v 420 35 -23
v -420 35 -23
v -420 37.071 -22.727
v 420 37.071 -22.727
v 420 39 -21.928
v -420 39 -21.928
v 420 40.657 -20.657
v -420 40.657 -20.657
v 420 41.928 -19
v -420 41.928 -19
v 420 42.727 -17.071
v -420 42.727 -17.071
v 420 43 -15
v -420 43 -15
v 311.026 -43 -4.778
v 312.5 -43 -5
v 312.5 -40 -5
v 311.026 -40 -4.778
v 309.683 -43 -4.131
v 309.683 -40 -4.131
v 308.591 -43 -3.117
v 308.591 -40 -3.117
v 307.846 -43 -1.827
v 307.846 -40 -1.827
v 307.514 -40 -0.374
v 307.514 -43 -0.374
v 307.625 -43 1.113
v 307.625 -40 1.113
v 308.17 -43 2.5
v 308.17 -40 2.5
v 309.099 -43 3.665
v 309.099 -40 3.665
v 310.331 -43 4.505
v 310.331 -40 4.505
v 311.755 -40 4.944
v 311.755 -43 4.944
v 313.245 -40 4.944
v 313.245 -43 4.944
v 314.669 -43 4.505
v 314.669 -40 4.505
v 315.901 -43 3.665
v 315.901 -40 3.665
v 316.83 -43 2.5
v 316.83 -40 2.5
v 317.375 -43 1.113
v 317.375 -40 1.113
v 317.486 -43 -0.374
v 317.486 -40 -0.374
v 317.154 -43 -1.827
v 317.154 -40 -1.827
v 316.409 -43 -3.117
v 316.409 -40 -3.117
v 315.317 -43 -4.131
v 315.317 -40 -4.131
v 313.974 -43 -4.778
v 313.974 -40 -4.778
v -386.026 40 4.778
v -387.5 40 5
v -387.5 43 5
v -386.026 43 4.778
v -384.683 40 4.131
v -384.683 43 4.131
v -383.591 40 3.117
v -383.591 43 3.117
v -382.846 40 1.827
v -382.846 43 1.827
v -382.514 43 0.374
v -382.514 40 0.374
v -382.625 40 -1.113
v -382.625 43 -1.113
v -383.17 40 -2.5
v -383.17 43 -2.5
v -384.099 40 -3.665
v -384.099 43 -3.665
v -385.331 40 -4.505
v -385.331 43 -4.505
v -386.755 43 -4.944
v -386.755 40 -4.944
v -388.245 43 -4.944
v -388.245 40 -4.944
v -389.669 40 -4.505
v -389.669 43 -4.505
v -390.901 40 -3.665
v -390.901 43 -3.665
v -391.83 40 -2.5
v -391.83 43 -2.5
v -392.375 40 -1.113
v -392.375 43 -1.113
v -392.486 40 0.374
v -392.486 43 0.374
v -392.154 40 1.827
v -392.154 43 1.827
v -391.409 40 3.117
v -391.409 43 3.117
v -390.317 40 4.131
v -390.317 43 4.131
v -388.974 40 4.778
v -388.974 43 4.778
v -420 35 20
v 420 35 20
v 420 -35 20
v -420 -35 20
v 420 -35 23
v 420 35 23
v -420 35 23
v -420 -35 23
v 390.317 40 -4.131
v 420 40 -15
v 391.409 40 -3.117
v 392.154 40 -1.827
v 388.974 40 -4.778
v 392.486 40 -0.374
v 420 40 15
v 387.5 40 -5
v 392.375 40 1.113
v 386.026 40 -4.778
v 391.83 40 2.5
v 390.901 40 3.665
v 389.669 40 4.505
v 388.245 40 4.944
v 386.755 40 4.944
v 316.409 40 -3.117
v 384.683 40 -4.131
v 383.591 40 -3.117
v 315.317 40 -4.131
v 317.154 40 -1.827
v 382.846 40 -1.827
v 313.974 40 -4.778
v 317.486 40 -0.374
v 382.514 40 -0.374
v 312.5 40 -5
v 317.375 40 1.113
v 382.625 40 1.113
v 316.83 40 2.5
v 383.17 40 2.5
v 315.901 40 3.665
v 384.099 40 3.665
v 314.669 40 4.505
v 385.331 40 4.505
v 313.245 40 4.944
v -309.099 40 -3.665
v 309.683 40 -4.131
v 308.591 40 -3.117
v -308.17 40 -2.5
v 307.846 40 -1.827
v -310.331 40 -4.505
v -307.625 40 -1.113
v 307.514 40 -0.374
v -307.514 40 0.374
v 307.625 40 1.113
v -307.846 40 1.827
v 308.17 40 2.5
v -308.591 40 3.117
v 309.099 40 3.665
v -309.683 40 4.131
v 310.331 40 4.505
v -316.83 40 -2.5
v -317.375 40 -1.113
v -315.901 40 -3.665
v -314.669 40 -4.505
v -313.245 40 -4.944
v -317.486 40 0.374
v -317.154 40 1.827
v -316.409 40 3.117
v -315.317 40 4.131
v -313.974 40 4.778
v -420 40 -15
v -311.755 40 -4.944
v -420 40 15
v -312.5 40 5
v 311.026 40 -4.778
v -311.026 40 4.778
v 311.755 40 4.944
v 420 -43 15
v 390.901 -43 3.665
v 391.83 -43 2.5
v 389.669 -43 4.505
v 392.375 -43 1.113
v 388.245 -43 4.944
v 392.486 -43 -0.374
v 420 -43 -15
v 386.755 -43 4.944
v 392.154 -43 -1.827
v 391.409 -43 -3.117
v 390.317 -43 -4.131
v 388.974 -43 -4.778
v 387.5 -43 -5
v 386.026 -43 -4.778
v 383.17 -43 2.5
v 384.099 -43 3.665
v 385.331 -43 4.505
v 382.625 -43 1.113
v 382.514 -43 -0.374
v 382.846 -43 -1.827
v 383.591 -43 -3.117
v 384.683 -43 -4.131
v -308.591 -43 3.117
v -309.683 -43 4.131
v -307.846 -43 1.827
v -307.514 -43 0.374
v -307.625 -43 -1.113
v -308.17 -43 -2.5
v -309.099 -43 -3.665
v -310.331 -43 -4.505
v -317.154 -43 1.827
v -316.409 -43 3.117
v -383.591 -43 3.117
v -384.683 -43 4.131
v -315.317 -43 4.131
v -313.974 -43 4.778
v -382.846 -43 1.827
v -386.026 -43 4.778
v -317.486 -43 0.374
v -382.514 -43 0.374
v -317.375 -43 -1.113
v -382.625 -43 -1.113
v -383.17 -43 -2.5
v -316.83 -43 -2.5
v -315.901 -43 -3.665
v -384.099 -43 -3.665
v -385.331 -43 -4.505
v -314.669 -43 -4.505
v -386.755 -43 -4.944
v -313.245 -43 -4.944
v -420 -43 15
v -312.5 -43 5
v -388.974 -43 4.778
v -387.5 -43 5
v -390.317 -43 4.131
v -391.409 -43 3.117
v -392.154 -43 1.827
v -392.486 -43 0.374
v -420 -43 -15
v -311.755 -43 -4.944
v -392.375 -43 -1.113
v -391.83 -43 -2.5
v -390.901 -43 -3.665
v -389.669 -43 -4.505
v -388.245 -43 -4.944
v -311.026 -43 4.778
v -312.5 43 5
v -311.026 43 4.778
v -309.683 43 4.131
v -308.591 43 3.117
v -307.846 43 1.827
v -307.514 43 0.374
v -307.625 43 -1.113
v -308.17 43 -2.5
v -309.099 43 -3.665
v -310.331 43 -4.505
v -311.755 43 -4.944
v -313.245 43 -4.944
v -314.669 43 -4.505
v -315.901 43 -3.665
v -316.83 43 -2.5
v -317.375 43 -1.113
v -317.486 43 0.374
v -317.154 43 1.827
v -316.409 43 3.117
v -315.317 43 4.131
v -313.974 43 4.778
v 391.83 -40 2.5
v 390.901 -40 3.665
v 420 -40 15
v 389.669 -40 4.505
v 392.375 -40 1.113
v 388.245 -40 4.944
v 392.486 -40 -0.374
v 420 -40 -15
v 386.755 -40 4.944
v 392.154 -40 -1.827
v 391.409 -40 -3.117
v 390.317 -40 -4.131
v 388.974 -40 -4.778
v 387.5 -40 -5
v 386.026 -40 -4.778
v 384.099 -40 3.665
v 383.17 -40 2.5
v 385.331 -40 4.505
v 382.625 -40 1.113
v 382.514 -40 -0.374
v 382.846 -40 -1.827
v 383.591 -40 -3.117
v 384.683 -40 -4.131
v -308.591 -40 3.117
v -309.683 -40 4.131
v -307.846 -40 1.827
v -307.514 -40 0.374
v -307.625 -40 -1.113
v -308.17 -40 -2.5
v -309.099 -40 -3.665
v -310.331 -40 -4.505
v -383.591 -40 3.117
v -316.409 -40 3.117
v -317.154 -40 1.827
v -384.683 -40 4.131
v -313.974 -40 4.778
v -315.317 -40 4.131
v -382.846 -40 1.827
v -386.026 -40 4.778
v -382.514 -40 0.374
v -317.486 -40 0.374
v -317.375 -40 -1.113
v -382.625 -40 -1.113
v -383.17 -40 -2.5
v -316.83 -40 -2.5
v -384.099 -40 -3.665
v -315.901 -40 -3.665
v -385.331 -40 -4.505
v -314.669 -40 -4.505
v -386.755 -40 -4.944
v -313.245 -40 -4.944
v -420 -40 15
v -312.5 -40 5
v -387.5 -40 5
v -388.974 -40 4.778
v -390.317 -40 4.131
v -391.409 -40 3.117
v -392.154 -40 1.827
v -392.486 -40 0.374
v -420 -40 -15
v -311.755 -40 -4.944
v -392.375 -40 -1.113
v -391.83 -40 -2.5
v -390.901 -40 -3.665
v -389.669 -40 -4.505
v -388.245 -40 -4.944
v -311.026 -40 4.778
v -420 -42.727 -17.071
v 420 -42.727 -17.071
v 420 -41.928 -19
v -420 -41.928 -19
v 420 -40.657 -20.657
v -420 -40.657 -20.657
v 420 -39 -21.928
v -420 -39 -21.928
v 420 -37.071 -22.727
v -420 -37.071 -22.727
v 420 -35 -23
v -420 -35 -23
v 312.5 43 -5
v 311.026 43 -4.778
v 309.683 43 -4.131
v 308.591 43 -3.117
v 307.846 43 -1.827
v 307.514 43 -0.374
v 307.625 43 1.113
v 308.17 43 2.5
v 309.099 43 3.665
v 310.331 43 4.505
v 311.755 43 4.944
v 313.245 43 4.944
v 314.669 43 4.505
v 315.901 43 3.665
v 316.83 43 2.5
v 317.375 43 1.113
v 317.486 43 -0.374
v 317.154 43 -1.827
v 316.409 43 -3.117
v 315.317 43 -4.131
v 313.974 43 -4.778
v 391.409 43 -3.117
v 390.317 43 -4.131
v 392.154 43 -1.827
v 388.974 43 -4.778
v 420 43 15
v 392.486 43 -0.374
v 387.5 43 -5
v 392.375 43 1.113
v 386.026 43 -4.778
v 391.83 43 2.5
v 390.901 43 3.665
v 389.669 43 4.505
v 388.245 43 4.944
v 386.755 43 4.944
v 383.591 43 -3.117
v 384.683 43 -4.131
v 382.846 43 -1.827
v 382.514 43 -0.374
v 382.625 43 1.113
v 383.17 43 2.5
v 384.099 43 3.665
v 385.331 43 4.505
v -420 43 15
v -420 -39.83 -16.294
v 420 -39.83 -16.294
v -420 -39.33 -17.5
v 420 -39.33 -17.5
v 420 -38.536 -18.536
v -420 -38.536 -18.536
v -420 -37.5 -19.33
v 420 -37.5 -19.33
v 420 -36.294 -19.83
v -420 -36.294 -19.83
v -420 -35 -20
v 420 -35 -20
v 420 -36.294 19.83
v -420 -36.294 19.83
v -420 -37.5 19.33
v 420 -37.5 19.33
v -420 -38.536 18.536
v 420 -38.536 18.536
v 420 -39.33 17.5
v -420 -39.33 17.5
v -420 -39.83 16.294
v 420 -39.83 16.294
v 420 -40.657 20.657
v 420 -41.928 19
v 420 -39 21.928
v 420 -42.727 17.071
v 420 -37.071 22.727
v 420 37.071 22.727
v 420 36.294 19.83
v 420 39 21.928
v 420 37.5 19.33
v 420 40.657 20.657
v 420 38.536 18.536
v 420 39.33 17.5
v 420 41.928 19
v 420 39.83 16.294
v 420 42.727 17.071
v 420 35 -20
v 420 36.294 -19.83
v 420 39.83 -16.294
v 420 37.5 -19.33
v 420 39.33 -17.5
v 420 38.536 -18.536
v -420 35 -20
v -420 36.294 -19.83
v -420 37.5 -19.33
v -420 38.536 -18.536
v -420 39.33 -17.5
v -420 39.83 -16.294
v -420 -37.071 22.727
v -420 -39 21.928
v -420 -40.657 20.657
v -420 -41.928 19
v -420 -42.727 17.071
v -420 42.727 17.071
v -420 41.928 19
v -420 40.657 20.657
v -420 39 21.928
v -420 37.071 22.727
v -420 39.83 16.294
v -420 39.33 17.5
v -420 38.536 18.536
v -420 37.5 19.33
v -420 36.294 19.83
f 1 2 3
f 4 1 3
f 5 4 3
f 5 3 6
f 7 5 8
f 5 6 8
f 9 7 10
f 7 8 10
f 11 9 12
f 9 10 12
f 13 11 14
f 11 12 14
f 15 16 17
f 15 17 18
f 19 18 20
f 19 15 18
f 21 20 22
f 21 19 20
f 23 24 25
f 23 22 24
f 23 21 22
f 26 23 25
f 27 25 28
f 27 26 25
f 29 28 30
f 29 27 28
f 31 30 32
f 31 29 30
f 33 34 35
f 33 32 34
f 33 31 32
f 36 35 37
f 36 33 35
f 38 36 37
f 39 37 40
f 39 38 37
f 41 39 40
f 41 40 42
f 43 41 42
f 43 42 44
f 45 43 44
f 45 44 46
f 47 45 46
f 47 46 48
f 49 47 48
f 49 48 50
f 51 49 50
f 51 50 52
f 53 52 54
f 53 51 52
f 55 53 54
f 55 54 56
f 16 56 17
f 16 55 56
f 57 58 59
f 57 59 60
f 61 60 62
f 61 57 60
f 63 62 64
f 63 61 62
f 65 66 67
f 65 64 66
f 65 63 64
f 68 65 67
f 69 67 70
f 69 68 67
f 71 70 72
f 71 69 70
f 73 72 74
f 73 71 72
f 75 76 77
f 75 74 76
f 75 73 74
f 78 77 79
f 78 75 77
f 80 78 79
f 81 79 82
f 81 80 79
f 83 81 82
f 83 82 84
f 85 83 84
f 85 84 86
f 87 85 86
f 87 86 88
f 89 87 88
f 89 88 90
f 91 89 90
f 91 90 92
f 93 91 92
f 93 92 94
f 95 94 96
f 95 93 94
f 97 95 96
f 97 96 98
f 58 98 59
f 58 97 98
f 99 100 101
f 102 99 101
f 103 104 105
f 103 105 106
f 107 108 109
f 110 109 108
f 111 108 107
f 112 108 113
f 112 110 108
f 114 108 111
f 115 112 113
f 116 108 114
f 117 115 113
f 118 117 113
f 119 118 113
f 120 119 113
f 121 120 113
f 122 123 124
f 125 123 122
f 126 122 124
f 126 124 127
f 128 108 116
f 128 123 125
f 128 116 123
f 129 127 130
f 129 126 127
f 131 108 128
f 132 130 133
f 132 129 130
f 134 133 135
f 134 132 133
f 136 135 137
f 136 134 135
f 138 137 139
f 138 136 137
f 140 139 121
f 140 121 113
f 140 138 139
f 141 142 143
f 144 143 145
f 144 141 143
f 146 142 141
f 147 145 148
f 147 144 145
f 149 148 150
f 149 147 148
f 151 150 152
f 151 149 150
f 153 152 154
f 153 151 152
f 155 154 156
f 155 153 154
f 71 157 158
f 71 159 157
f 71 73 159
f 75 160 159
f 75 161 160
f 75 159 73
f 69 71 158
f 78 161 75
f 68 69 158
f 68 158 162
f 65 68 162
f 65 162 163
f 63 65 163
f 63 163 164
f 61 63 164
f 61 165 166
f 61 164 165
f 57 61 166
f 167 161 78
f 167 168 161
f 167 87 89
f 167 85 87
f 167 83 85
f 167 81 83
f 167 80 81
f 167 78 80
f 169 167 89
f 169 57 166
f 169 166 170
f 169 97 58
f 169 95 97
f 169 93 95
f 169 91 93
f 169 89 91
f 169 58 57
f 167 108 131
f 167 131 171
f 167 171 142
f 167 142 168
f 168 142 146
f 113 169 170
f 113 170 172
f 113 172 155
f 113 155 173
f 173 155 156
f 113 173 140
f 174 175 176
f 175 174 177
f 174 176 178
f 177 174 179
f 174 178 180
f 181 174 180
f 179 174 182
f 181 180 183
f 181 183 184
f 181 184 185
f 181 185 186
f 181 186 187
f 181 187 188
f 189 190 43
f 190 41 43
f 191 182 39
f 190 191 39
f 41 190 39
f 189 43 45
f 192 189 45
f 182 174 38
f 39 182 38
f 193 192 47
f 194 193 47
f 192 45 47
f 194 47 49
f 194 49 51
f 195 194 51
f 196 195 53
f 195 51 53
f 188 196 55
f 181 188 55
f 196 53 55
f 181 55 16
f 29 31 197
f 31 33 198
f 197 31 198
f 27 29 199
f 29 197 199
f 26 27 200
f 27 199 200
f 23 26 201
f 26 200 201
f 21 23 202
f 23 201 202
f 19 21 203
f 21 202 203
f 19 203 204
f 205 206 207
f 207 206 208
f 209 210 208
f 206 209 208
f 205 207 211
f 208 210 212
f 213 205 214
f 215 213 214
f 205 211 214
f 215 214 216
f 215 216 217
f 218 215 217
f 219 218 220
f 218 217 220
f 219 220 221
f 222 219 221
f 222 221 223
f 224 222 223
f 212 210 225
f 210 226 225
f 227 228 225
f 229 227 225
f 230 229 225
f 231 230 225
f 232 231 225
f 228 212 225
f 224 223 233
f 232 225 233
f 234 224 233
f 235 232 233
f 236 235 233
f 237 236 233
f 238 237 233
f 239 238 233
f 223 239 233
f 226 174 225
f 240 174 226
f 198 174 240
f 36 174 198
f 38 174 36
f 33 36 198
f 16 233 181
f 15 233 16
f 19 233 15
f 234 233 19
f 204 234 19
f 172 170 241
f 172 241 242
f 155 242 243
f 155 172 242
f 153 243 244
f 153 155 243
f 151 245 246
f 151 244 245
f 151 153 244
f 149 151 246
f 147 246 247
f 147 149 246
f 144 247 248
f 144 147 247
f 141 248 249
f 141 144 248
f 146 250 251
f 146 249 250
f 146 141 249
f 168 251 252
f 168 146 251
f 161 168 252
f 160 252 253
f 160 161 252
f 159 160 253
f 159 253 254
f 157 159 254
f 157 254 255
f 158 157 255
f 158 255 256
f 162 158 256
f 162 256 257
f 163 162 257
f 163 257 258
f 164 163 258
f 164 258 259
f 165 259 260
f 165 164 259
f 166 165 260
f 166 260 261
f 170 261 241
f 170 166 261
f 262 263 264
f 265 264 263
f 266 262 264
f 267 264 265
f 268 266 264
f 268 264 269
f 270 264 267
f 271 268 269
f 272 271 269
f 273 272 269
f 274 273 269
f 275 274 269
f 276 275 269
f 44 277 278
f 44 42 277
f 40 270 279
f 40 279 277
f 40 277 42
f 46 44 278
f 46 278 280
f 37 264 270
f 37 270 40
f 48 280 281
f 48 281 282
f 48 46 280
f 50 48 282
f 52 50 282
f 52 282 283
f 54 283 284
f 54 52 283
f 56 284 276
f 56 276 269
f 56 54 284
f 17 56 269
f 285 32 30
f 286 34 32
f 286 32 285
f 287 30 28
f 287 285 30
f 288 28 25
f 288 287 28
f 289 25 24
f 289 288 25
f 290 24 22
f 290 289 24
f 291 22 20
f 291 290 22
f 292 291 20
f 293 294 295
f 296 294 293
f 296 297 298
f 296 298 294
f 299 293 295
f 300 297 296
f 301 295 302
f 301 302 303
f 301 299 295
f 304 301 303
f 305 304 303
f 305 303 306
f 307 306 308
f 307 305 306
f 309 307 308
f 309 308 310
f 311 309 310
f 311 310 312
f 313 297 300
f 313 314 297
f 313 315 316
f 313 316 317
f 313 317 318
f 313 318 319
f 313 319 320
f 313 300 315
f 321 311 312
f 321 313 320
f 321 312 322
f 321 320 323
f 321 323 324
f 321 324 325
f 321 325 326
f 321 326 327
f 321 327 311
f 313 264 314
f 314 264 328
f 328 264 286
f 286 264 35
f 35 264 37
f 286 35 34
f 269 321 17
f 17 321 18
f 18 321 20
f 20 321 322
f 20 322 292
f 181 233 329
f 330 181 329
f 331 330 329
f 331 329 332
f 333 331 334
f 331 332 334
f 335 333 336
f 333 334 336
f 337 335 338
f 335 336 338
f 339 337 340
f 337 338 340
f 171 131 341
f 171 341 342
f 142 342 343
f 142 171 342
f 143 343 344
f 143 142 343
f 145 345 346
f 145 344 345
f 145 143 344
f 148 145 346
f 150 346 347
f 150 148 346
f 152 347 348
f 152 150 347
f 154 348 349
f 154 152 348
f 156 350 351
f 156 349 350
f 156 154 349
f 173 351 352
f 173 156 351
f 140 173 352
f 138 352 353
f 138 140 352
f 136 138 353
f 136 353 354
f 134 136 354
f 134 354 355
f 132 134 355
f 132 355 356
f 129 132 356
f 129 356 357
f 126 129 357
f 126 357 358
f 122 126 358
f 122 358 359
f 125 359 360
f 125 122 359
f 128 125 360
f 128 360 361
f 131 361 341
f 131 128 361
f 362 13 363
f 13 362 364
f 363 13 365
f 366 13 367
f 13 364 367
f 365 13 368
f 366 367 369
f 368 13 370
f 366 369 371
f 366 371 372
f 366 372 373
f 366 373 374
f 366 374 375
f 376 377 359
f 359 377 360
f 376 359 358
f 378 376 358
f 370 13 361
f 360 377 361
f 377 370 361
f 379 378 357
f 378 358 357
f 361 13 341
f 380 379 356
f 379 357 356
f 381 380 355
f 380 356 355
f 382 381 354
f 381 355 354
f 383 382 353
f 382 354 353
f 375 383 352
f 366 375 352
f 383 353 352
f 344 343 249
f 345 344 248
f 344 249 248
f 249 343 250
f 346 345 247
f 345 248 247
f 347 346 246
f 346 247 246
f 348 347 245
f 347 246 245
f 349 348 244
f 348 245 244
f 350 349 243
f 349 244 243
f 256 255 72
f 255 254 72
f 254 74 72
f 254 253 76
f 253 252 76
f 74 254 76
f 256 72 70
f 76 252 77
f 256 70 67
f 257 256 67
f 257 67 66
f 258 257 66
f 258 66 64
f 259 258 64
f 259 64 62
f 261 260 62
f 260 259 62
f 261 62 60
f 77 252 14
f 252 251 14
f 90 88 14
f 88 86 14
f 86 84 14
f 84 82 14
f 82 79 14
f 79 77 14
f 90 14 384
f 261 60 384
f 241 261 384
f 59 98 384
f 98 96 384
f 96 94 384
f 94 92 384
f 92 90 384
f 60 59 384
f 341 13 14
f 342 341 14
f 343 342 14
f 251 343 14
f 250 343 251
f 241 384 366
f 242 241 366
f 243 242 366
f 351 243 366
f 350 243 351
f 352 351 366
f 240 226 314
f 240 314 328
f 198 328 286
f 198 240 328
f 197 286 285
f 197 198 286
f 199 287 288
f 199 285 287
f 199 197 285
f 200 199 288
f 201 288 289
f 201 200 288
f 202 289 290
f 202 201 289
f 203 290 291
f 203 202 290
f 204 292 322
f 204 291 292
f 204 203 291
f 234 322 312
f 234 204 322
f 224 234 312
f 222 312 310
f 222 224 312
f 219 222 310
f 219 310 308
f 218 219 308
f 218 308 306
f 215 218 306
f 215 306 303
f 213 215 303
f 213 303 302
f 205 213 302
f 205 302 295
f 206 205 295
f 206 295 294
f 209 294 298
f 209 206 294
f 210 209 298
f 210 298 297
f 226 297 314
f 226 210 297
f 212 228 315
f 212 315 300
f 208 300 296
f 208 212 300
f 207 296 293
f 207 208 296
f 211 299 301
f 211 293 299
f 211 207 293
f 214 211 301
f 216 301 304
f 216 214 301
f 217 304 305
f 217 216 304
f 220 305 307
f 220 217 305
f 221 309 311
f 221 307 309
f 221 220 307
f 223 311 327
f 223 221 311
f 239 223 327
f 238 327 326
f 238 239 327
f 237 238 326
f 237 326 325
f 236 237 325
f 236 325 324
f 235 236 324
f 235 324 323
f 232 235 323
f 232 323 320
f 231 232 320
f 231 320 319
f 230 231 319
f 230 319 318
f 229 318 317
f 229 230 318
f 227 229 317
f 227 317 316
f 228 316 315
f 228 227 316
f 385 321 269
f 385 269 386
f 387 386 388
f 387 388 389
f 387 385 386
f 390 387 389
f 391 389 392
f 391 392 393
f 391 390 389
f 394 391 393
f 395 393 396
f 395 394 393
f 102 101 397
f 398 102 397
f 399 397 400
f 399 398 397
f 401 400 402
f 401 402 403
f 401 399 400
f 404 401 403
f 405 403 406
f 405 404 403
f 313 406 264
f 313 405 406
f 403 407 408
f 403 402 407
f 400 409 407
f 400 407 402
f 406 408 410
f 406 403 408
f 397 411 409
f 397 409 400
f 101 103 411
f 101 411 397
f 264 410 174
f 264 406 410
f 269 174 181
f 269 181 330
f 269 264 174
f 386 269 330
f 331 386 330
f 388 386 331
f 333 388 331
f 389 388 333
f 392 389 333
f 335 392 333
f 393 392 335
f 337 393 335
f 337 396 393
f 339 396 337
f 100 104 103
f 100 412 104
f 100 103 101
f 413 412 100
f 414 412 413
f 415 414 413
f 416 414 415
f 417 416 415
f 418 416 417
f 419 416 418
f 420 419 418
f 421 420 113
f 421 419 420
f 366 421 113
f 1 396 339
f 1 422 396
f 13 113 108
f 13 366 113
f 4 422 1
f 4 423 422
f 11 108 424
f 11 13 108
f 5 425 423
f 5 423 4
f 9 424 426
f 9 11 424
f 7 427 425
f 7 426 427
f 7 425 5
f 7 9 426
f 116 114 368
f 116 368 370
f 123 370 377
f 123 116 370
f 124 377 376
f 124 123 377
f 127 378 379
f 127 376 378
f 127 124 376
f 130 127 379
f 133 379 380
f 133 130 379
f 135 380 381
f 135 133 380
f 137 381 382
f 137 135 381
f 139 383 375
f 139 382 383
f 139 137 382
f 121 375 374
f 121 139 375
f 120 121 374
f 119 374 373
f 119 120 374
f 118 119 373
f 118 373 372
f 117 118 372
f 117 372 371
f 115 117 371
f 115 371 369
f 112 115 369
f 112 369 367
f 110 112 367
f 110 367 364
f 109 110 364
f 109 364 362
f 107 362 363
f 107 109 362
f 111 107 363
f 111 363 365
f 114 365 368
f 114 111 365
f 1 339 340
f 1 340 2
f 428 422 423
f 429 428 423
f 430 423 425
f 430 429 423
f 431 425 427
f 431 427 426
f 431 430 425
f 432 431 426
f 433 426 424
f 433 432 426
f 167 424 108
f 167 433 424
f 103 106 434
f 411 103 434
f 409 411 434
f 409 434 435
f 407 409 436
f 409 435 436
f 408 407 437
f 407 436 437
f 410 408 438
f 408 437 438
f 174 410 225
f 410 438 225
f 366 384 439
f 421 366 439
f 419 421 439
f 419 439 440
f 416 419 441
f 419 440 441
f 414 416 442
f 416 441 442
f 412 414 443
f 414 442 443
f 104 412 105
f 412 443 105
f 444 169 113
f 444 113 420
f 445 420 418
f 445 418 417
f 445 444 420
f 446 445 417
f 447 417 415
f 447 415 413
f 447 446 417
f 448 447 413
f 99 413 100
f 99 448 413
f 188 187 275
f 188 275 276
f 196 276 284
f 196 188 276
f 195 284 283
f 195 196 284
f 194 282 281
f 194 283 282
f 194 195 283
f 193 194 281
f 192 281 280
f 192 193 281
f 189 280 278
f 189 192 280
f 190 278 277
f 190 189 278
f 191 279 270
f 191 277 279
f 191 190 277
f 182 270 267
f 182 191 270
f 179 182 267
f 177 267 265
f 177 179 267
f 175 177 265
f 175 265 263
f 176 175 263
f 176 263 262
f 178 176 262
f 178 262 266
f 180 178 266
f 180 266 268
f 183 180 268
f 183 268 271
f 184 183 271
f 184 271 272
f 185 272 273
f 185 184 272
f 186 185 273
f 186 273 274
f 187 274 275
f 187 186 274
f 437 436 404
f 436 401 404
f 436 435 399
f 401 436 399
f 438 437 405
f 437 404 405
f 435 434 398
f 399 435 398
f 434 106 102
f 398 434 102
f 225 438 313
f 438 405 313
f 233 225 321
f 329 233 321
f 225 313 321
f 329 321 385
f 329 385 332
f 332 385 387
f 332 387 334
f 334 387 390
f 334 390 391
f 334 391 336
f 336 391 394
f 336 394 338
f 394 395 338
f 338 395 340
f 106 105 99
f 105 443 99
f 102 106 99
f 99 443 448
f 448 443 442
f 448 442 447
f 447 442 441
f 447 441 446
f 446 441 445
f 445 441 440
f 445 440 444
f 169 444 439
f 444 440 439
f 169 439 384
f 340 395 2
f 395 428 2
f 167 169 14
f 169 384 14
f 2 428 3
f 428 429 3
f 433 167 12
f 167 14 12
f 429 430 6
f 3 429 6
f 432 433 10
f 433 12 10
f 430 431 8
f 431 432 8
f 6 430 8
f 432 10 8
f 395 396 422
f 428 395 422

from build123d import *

# Parameters (mm, degrees)
EXTRUDE_THIN1_DEPTH      = 420
EXTRUDE_THIN1_DEPTH_BACK = 420
CUT_EXTRUDE1_DEPTH       = 423.82147533
CUT_EXTRUDE1_DEPTH_BACK  = 423.82147533
SKETCH3_R                = 5


with BuildPart() as part:
    # Sketch1 → Extrude-Thin1 (new, two sides: drawn at the far end of the back side and taken through both)
    with BuildSketch(Plane(origin=(0, 0, 0), x_dir=(0, 0, -1), z_dir=(1, 0, 0)).offset(-EXTRUDE_THIN1_DEPTH_BACK)):
        with BuildLine():
            Line((-23, 35), (-23, -35))
            ThreePointArc((-23, -35), (-20.656854249, -40.656854249), (-15, -43))
            Line((-15, -43), (15, -43))
            ThreePointArc((15, -43), (20.656854249, -40.656854249), (23, -35))
            Line((23, -35), (23, 35))
            ThreePointArc((23, 35), (20.656854249, 40.656854249), (15, 43))
            Line((15, 43), (-15, 43))
            ThreePointArc((-15, 43), (-20.656854249, 40.656854249), (-23, 35))
        make_face()
        with BuildLine():
            Line((-20, 35), (-20, -35))
            ThreePointArc((-20, -35), (-18.535533906, -38.535533906), (-15, -40))
            Line((-15, -40), (15, -40))
            ThreePointArc((15, -40), (18.535533906, -38.535533906), (20, -35))
            Line((20, -35), (20, 35))
            ThreePointArc((20, 35), (18.535533906, 38.535533906), (15, 40))
            Line((15, 40), (-15, 40))
            ThreePointArc((-15, 40), (-18.535533906, 38.535533906), (-20, 35))
        make_face(mode=Mode.SUBTRACT)
    extrude(amount=EXTRUDE_THIN1_DEPTH + EXTRUDE_THIN1_DEPTH_BACK)

    # Sketch3 → Cut-Extrude1 (cut, two sides: drawn at the far end of the back side and taken through both)
    with BuildSketch(Plane(origin=(0, 0, 0), x_dir=(1, 0, 0), z_dir=(0, 1, 0)).offset(-CUT_EXTRUDE1_DEPTH_BACK)):
        with Locations(Location((-387.5, 0, 0), (0, 0, 270))):
            Circle(SKETCH3_R)
        with Locations(Location((-312.5, 0, 0), (0, 0, 270))):
            Circle(SKETCH3_R)
        with Locations(Location((387.5, 0, 0), (0, 0, 90))):
            Circle(SKETCH3_R)
        with Locations(Location((312.5, 0, 0), (0, 0, 90))):
            Circle(SKETCH3_R)
    extrude(amount=CUT_EXTRUDE1_DEPTH + CUT_EXTRUDE1_DEPTH_BACK, mode=Mode.SUBTRACT)


solid = part.part
